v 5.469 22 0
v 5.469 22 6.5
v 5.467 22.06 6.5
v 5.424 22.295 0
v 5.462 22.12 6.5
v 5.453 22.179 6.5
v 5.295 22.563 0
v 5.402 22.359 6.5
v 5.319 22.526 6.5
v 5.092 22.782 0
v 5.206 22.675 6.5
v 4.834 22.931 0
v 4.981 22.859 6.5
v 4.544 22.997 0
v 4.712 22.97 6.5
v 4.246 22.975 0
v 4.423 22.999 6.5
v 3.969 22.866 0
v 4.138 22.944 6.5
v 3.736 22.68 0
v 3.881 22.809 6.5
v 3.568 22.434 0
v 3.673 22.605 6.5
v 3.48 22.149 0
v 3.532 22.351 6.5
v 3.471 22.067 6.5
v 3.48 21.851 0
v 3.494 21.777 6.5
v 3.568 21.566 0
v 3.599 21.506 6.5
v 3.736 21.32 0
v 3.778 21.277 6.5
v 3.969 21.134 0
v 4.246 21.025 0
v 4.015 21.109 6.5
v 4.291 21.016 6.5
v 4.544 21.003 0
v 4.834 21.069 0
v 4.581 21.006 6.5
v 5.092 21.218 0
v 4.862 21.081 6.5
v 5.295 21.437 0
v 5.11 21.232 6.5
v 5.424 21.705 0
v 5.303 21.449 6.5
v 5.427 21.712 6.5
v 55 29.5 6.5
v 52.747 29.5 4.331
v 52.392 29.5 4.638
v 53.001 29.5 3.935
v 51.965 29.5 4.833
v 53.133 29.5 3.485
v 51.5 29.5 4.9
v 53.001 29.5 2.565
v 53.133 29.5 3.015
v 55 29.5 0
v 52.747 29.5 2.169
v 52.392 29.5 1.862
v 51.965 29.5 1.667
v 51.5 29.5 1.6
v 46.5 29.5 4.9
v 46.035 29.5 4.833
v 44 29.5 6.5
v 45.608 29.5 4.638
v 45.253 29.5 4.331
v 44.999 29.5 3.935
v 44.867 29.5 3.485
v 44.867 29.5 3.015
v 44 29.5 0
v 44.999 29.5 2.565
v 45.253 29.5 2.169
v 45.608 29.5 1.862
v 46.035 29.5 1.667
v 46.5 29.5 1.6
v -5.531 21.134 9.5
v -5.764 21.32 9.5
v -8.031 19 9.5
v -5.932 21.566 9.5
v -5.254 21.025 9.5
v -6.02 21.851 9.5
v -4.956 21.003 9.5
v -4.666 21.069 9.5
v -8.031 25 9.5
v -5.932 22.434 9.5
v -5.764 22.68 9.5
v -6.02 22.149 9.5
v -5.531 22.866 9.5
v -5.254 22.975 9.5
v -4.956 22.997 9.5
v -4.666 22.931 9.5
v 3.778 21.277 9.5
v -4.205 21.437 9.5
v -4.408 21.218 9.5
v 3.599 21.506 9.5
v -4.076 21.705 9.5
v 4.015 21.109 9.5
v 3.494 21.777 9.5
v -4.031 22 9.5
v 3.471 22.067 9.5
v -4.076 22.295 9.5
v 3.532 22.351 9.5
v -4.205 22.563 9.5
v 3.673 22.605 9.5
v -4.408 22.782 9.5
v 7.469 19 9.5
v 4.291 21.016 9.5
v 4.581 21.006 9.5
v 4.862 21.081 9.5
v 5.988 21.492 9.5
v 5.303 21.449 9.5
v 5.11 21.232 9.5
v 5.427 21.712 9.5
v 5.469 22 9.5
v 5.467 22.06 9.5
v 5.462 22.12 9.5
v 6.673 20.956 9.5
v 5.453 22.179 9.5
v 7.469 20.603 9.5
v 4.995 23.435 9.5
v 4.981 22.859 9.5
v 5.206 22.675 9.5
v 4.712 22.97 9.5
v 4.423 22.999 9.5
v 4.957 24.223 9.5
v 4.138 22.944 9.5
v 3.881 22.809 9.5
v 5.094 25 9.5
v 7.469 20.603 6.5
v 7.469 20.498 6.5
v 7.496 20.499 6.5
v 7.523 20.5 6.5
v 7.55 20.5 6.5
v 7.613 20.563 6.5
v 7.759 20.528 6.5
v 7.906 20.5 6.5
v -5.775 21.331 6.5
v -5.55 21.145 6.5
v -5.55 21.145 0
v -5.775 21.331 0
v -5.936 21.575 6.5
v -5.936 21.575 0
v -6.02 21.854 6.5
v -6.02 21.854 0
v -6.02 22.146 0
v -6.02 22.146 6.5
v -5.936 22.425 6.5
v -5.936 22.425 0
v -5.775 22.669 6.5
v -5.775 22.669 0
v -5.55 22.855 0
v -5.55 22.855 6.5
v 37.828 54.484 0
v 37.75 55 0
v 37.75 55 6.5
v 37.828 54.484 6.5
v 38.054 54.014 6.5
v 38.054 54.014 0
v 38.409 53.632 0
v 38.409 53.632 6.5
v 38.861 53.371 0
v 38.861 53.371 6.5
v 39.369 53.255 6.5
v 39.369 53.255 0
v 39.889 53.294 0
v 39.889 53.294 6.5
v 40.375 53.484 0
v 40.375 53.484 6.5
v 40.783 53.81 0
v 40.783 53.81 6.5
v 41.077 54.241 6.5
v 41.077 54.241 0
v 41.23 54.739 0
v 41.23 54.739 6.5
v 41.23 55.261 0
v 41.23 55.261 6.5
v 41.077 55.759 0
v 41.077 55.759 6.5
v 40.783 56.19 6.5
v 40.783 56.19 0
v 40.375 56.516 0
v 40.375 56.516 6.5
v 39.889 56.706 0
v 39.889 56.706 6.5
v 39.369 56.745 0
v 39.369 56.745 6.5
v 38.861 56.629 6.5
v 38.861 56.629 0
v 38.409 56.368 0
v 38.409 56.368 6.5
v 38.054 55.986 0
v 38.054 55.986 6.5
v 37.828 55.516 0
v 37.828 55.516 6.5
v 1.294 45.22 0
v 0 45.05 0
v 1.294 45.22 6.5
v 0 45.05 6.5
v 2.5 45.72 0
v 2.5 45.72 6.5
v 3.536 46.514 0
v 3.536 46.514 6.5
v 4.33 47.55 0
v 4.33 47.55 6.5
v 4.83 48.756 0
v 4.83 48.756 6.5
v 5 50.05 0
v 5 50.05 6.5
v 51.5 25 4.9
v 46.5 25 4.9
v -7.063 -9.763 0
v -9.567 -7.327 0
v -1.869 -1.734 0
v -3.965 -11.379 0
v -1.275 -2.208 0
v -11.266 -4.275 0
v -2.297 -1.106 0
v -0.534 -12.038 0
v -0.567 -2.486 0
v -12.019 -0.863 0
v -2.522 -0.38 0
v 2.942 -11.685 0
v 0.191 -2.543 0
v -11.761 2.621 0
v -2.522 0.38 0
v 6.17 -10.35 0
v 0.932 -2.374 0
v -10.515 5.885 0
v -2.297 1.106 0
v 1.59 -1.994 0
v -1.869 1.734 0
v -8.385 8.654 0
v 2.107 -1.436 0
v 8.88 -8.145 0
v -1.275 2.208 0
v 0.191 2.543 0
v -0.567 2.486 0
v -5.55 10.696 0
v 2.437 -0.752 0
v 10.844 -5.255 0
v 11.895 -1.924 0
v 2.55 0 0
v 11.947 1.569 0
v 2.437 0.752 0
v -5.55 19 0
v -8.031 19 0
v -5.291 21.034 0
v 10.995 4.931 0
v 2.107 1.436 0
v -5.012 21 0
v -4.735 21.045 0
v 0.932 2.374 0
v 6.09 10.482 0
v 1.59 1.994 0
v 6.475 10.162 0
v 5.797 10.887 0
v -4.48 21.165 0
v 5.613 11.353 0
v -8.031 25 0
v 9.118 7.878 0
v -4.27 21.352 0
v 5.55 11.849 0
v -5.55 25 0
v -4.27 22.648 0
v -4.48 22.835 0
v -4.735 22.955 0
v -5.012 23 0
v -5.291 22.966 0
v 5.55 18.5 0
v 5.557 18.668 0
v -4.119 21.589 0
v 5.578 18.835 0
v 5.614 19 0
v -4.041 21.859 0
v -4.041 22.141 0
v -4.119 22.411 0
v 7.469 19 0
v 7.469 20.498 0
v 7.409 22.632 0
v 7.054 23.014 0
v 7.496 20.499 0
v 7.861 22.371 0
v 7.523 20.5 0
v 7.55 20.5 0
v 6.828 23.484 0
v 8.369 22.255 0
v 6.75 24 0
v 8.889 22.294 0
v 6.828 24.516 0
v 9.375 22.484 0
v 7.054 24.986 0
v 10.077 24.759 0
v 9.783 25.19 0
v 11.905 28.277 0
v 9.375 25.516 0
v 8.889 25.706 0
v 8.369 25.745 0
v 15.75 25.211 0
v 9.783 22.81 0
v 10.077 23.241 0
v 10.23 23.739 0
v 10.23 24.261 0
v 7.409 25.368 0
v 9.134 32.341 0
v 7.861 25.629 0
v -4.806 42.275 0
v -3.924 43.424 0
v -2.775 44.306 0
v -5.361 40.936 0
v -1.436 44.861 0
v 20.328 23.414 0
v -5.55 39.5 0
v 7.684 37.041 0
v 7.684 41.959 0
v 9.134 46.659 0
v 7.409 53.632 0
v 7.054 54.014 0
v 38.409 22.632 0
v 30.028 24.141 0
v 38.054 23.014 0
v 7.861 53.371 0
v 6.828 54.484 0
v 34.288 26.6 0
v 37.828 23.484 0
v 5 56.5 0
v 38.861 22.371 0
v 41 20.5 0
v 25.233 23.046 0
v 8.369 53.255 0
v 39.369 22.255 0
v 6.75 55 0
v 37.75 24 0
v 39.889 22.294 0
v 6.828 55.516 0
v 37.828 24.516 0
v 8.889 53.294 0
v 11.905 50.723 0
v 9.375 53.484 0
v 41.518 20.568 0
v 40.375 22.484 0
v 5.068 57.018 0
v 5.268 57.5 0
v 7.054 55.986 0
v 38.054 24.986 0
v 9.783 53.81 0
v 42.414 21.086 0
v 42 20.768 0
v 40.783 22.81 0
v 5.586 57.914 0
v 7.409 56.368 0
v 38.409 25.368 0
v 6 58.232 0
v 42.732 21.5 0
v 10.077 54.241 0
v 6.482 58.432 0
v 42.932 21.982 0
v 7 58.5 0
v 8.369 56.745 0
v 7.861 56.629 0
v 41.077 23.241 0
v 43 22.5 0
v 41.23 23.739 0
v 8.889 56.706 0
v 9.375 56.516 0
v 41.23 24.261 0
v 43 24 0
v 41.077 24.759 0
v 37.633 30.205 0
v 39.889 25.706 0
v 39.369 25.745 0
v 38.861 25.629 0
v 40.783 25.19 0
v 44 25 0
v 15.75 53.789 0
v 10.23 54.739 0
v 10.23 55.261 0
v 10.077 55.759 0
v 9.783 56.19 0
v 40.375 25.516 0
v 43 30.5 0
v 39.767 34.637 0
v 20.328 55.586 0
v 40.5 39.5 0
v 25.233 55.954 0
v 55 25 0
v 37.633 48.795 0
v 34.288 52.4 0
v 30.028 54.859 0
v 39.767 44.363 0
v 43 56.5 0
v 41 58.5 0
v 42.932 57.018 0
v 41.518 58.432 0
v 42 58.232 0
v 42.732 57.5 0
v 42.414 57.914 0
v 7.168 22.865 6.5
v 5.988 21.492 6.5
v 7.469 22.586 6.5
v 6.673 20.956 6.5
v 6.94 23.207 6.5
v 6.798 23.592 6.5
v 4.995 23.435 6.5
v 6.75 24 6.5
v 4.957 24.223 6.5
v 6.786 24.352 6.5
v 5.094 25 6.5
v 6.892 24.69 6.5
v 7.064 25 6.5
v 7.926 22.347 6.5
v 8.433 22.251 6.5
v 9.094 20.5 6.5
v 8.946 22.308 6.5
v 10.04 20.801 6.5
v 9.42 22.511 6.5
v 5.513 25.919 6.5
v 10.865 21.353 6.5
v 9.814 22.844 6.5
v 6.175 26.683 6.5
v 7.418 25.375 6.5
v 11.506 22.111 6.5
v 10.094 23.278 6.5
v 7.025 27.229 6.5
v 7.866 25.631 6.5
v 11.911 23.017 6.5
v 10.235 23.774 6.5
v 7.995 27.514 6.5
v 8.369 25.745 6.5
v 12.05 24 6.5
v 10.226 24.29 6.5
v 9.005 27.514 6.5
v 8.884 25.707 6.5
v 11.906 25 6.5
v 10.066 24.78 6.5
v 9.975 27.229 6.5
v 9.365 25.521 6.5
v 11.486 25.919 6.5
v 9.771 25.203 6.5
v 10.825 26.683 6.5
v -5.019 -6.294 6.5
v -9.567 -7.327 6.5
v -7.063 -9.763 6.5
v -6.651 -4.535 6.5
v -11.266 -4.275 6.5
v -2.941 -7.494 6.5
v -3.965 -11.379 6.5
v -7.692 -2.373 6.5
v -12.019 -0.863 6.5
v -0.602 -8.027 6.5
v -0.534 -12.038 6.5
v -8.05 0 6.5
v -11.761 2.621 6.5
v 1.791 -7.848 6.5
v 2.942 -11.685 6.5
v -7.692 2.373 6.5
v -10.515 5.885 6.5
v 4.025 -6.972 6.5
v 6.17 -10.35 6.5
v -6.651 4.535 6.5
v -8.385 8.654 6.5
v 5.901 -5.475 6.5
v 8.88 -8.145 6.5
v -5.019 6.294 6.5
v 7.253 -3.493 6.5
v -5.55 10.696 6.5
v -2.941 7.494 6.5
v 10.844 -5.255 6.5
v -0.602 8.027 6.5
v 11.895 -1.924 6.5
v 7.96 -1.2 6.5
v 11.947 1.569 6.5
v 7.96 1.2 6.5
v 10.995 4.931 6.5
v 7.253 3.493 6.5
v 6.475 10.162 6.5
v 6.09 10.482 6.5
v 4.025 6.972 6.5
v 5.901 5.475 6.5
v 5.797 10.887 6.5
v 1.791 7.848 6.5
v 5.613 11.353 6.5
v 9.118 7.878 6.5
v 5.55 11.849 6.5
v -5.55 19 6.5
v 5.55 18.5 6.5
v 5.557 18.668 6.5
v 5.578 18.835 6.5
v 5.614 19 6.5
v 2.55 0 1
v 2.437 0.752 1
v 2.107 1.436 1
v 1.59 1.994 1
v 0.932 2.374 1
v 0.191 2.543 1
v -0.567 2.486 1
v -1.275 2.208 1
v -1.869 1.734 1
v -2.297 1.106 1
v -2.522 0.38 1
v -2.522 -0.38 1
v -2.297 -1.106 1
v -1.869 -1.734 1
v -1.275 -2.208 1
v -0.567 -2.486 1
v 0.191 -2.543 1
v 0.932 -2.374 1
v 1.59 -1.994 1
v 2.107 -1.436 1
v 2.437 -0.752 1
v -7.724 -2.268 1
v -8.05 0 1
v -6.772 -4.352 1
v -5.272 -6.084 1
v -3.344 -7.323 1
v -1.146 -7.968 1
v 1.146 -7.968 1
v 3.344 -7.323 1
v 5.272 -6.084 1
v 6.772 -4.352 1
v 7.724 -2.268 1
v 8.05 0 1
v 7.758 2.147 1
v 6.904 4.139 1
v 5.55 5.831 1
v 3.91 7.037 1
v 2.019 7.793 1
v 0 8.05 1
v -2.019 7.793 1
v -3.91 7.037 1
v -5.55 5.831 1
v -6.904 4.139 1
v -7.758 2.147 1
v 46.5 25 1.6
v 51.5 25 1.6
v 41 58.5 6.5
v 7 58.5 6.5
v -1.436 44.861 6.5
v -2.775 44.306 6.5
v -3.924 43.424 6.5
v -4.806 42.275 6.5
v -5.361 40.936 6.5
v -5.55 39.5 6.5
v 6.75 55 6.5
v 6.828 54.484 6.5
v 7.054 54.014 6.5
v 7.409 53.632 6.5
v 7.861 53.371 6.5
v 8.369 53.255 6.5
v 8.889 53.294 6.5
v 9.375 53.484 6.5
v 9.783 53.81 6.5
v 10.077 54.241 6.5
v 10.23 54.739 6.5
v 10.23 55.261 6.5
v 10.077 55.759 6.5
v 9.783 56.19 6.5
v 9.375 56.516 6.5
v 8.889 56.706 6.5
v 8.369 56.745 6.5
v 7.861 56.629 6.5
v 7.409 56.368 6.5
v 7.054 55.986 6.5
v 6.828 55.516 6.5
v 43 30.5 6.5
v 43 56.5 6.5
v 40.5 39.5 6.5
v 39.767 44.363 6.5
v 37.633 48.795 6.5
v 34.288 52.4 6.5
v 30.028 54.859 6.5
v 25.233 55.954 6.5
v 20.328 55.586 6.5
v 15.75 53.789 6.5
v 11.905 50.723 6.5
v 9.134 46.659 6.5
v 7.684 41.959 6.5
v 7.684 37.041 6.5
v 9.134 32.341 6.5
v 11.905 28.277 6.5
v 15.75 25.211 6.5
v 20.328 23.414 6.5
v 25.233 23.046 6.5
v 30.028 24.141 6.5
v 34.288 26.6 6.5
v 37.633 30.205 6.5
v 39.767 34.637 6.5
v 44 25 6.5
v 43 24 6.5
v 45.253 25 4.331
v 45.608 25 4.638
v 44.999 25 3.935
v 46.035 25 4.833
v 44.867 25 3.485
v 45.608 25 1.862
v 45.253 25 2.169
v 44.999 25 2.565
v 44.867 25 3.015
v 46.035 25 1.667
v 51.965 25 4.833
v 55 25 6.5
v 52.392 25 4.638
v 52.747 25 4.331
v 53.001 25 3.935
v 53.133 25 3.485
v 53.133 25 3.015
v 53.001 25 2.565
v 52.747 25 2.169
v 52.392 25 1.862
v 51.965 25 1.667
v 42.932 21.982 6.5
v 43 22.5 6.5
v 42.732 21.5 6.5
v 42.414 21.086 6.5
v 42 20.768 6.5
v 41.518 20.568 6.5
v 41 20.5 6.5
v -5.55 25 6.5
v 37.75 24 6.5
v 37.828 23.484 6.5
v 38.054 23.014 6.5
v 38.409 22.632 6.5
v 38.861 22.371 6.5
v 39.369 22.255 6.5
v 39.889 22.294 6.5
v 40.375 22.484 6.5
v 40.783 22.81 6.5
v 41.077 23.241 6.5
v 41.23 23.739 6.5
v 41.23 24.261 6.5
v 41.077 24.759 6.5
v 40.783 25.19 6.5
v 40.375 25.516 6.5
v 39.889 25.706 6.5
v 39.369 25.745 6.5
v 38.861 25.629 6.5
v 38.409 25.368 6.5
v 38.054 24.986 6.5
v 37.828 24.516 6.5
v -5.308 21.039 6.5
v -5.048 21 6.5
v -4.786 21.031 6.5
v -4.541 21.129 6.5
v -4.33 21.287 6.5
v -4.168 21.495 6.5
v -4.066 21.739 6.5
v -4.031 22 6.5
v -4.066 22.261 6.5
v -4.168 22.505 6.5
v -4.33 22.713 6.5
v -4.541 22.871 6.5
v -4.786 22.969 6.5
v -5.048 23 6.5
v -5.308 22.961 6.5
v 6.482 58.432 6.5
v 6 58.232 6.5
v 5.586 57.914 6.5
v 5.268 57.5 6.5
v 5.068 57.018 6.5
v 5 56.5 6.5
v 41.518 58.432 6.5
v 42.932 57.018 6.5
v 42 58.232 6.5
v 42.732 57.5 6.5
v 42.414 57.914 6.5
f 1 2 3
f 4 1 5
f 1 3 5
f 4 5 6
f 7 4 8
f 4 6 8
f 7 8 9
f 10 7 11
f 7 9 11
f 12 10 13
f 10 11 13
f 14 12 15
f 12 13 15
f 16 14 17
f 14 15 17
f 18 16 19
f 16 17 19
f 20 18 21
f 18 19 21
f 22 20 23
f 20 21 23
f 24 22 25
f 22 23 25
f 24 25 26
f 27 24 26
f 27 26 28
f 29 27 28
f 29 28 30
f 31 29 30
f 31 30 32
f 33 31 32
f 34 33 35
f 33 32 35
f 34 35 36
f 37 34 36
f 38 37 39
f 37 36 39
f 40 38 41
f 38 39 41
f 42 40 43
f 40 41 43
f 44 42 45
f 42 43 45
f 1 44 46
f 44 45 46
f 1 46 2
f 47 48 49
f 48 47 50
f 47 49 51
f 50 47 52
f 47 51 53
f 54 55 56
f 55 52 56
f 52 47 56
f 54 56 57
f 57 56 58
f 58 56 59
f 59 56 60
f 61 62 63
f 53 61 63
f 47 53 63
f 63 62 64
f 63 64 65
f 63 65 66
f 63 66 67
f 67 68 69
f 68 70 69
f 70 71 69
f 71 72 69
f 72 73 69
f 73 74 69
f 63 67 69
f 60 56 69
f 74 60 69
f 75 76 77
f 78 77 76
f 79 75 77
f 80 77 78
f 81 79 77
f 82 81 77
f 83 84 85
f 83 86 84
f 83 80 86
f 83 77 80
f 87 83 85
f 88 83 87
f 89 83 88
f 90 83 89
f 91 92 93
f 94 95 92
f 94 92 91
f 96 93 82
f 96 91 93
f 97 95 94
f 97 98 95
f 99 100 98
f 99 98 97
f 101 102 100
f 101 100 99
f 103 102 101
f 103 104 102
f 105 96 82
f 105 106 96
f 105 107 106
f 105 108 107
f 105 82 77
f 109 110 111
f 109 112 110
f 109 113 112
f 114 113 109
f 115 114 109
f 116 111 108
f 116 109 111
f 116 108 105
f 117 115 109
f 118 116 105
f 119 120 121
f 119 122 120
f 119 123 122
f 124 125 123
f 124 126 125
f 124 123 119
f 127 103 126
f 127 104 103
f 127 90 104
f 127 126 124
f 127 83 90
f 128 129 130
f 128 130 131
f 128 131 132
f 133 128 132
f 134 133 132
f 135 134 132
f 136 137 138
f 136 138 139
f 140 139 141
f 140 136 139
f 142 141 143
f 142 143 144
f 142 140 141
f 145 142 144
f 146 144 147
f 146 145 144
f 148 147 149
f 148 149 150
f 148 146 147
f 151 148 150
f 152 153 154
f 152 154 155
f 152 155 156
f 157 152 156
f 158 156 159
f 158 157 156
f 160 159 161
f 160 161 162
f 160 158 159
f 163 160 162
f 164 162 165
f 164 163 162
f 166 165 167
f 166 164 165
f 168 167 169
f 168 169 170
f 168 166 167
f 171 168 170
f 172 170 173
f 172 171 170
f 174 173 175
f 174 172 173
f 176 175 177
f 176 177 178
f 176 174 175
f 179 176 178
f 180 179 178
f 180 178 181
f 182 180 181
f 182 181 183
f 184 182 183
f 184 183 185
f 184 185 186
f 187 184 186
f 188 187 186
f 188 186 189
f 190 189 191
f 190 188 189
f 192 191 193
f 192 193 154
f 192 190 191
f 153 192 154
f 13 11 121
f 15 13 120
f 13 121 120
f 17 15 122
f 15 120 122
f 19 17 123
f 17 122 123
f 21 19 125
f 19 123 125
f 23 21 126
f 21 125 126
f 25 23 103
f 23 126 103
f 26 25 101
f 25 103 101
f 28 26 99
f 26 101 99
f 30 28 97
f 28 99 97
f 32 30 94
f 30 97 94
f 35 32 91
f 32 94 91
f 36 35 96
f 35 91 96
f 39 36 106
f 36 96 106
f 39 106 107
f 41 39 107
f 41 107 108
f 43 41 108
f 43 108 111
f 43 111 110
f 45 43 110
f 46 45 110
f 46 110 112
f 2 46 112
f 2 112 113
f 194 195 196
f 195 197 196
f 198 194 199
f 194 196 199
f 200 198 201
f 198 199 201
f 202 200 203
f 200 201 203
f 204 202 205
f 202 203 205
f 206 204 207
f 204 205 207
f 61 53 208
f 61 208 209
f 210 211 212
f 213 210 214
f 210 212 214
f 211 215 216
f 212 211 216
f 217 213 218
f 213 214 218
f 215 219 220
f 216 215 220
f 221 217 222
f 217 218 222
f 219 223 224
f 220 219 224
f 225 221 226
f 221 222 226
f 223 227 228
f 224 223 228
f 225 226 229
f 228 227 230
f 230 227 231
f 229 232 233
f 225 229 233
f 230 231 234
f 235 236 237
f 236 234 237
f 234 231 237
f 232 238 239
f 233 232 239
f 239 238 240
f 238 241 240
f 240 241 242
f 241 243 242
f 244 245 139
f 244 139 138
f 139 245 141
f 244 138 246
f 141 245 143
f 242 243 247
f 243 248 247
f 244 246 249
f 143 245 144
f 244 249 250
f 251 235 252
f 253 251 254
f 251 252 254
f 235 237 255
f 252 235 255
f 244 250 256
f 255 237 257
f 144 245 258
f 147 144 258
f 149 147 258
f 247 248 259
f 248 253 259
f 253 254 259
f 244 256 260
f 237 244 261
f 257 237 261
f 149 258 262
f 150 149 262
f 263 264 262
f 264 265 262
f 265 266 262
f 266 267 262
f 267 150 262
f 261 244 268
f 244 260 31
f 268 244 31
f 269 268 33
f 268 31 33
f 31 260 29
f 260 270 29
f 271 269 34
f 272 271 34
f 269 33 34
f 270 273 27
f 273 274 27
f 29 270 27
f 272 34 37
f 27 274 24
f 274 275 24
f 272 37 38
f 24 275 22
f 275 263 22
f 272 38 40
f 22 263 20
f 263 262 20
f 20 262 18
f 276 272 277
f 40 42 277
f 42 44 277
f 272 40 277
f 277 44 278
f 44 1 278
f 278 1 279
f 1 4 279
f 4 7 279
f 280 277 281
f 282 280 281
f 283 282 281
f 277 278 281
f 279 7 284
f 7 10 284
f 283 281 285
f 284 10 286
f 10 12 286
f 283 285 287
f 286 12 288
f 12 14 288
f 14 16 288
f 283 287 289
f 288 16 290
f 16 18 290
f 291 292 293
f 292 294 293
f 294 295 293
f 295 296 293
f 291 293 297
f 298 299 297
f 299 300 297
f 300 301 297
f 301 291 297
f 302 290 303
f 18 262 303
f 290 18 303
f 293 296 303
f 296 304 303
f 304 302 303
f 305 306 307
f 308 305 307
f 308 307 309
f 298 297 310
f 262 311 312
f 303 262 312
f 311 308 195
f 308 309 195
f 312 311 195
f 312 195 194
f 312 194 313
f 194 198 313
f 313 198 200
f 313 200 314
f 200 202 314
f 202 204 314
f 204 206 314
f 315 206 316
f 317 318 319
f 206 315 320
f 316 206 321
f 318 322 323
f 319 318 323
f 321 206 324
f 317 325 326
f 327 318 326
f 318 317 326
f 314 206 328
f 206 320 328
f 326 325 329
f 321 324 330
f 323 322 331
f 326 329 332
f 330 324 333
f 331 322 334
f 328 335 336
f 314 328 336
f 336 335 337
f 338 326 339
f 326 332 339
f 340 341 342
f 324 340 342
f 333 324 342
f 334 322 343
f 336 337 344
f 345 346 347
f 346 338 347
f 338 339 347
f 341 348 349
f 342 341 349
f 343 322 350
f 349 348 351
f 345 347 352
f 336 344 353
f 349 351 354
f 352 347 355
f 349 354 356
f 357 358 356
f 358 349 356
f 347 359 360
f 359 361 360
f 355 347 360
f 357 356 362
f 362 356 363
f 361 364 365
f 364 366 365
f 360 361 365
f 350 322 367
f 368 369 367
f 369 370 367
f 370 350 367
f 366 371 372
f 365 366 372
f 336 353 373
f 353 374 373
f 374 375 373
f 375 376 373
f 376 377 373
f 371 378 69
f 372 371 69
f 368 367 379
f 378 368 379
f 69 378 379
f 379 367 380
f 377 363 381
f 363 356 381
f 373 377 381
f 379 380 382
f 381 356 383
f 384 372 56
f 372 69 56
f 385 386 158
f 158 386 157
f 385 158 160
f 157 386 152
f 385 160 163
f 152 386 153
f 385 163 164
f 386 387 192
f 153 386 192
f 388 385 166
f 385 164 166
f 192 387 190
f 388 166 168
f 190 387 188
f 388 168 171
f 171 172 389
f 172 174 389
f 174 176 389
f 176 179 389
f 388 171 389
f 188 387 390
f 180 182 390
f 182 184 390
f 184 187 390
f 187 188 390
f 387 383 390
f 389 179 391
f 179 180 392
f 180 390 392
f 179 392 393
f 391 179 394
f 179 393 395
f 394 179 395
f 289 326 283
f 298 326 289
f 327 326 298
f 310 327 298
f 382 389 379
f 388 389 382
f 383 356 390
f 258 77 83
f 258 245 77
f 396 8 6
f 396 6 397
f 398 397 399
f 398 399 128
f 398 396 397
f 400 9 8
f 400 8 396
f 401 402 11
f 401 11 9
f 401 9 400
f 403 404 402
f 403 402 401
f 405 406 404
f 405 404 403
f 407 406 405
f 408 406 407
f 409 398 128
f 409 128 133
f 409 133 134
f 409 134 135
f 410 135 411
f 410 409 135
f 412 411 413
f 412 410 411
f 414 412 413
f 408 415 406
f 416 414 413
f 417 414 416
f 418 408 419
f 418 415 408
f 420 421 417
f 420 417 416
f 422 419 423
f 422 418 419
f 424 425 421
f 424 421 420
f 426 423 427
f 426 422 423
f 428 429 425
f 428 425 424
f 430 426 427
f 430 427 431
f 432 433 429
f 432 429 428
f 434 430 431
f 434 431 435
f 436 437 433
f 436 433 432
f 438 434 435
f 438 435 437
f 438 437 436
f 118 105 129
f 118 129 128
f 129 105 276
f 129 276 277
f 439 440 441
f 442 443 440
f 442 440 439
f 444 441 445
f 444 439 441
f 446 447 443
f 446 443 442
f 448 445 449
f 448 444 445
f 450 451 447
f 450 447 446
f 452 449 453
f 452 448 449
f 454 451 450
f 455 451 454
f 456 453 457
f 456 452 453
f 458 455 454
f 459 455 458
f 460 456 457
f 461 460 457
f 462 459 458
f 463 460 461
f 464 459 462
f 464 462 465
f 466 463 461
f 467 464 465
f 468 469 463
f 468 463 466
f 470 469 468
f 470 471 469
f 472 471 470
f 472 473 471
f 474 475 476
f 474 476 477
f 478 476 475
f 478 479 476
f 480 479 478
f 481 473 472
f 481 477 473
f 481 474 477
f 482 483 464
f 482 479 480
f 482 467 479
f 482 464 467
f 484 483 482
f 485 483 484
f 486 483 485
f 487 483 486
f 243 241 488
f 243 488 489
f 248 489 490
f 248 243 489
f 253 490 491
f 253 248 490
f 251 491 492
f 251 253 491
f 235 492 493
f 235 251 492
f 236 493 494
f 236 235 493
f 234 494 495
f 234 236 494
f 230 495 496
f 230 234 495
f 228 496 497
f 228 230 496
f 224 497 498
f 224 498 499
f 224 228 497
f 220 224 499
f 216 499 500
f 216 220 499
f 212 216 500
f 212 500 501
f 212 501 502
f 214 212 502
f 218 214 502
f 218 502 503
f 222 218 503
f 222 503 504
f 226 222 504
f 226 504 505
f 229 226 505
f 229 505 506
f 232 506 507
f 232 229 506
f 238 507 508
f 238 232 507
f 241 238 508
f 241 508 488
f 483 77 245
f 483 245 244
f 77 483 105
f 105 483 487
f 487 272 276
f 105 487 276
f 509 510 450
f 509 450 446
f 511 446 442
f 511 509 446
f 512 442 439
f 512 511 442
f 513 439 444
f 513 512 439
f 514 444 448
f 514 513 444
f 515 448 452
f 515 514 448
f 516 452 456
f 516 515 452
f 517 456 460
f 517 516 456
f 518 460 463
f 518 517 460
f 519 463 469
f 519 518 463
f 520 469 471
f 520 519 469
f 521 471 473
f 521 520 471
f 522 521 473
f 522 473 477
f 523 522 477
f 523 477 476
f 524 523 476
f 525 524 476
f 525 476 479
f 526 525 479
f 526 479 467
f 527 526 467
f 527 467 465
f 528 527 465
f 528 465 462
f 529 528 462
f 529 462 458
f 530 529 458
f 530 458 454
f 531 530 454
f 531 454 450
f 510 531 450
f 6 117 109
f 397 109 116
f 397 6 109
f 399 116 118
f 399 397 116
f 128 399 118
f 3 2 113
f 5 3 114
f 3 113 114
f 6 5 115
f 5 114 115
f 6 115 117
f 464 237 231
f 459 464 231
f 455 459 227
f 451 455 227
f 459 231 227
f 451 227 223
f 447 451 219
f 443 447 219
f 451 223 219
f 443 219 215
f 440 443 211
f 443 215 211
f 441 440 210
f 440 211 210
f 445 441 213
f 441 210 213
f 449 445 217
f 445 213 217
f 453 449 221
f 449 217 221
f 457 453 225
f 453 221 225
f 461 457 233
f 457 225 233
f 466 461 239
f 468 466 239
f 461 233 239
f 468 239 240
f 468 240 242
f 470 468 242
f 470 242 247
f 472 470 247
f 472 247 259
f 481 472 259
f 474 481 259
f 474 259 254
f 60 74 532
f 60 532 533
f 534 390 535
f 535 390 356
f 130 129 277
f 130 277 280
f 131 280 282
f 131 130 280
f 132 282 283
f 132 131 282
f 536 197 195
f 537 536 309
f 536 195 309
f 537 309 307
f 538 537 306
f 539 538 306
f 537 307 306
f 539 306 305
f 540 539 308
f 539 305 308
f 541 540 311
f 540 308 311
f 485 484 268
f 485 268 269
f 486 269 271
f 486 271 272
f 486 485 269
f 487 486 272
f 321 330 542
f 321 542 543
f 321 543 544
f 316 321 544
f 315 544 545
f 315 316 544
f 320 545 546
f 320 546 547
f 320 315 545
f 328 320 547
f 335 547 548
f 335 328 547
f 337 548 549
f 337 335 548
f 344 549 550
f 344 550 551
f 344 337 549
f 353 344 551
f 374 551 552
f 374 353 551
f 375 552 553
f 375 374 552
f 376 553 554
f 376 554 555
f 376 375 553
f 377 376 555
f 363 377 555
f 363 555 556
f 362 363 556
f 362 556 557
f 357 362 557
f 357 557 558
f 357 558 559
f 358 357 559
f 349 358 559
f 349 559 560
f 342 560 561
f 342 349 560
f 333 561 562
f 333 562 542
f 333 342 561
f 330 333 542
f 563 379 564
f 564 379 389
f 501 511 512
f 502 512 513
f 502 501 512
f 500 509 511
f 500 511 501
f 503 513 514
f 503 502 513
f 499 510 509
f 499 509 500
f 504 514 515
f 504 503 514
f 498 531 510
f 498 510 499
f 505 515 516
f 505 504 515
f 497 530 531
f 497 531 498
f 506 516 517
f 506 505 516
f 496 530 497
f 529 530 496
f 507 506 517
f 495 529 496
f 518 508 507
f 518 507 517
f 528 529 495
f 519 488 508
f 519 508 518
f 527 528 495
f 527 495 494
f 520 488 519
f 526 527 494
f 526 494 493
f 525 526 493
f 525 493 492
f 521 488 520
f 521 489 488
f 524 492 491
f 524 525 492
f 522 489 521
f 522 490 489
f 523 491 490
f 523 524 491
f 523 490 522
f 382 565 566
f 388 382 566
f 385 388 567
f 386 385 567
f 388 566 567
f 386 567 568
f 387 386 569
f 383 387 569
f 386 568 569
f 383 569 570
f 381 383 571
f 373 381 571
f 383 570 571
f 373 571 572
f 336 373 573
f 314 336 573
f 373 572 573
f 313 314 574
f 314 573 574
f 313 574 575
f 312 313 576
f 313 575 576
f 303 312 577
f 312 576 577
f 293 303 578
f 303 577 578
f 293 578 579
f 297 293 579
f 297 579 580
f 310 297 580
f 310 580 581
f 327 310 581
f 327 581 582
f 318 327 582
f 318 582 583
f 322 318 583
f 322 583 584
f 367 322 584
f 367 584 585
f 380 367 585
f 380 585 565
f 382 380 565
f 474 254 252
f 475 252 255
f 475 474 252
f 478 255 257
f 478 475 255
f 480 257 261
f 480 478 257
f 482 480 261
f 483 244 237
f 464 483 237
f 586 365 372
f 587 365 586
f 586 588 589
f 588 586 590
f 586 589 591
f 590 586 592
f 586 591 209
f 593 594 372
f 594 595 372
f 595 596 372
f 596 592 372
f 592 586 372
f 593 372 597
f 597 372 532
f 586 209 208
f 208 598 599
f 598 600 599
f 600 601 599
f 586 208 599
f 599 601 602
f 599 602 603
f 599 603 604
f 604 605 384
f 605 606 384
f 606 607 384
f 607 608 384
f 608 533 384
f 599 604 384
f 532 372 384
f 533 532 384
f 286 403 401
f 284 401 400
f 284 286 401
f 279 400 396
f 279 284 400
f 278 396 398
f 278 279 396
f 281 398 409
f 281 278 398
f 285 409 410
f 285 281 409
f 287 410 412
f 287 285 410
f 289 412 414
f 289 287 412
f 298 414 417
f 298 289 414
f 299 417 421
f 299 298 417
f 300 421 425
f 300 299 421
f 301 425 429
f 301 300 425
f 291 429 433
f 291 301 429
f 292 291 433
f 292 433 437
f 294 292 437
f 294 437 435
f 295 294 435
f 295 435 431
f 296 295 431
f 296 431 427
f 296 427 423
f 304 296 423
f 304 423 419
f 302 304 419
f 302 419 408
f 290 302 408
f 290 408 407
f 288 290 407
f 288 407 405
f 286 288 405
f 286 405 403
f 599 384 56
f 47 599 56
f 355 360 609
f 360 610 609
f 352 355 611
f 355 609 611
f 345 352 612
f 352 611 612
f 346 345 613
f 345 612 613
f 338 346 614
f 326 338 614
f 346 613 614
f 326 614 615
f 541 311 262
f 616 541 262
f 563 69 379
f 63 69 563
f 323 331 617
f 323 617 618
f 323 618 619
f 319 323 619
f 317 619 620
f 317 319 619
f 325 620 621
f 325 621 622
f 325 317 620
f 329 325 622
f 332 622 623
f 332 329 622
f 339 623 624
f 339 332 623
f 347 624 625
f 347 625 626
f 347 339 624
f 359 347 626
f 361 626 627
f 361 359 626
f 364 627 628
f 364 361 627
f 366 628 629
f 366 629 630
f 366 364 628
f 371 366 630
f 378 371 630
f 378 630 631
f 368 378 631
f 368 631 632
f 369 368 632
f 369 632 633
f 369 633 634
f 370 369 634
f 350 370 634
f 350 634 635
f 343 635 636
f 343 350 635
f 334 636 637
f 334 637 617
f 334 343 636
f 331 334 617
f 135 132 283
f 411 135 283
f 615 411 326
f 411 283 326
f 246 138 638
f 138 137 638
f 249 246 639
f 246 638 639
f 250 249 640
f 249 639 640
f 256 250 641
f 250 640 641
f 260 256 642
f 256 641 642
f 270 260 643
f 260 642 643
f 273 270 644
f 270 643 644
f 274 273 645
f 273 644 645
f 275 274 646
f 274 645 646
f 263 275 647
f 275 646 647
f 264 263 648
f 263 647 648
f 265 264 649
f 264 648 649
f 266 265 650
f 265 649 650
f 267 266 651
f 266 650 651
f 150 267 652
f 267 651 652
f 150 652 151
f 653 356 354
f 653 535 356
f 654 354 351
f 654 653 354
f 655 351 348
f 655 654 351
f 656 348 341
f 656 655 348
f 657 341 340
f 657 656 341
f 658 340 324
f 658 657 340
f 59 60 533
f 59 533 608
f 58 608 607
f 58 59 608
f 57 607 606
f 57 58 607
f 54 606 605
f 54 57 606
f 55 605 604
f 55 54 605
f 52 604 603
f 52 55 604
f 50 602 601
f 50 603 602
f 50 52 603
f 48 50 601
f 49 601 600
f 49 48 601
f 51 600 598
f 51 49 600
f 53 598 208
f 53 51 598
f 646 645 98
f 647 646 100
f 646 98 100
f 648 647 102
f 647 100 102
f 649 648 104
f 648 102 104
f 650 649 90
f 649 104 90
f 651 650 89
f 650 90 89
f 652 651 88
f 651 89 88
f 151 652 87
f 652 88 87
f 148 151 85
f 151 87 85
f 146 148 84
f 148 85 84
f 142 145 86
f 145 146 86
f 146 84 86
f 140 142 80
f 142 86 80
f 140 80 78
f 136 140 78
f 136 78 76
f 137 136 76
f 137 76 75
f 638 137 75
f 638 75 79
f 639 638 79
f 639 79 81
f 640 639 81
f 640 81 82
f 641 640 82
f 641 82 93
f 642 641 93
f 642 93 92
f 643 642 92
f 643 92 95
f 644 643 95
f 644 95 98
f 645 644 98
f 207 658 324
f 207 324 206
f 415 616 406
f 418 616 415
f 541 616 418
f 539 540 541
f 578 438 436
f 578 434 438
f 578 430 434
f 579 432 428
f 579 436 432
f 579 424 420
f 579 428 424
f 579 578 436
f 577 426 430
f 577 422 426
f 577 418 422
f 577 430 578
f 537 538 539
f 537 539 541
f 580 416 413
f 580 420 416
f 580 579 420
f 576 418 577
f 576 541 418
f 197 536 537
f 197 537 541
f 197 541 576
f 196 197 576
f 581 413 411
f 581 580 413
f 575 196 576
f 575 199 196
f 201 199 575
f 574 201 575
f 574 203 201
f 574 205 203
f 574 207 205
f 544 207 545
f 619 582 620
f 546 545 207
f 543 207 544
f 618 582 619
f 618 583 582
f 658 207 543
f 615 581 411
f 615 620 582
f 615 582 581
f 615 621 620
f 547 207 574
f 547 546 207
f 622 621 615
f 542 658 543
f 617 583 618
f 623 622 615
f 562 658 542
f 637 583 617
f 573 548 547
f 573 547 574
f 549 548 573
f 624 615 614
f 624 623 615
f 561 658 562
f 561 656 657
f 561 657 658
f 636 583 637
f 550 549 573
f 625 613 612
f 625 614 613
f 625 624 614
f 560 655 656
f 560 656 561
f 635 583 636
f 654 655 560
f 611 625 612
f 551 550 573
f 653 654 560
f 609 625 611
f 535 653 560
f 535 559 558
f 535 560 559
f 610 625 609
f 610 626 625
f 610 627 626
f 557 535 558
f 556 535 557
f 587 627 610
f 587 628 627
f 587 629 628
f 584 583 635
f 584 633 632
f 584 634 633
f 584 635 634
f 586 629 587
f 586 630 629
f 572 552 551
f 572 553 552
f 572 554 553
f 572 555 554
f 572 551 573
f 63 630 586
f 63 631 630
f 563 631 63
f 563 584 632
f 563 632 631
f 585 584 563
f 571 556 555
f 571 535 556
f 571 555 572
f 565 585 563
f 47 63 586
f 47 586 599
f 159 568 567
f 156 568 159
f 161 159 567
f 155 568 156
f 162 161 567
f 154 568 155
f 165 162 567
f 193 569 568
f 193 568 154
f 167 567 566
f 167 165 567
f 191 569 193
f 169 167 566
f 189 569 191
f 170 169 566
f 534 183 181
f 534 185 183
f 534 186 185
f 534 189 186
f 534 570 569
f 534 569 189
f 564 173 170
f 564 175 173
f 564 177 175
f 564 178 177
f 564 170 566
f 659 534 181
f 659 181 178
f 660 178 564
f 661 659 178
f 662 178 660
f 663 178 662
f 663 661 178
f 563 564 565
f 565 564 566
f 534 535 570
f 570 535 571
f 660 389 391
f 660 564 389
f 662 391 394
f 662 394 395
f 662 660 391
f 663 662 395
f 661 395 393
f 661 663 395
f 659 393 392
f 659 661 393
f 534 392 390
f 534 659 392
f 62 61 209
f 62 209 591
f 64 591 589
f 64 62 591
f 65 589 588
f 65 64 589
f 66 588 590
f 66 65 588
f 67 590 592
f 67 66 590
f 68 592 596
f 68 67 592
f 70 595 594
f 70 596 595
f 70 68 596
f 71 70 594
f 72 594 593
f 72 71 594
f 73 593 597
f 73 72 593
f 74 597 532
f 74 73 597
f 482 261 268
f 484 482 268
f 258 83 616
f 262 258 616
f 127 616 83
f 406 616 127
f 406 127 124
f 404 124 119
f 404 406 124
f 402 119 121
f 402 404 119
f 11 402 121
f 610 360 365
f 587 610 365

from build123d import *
from build123d.topology import SkipClean

# Parameters (mm, degrees)
SKETCH1_R           = 8.05
SKETCH1_R_2         = 1.75
SKETCH1_R_3         = 12.5
BOSS_EXTRUDE3_DEPTH = 6.5
SKETCH1_5_R         = 2.55
BOSS_EXTRUDE2_DEPTH = 1
CUT_EXTRUDE1_DEPTH  = 10
FILLET2_R           = 2
FILLET5_R           = 5
CHAMFER2_SIZE       = 1
FILLET1_R           = 2
SKETCH5_R           = 16.5
CUT_EXTRUDE2_DEPTH  = 10
SKETCH4_R           = 1
CUT_EXTRUDE3_DEPTH  = 10
SKETCH4_4_W         = 1.918871126
SKETCH4_4_H         = 1.5
BOSS_EXTRUDE4_DEPTH = 6.5
SKETCH4_5_W         = 15.5
SKETCH4_5_H         = 6
BOSS_EXTRUDE5_DEPTH = 3
CUT_EXTRUDE5_START  = 9
SKETCH4_6_R         = 1
CUT_EXTRUDE5_DEPTH  = 9
SKETCH6_R           = 3.55
CUT_EXTRUDE6_DEPTH  = 8


with BuildPart() as part:
    # Sketch1 → Boss-Extrude3 (new body)
    with BuildSketch(Plane.XY):
        with BuildLine():
            ThreePointArc((-5.55, 10.695793566), (0, -12.05), (5.55, 10.695793566))
            Line((5.55, 10.695793566), (5.55, 20.5))
            Line((5.55, 20.5), (43, 20.5))
            Line((43, 20.5), (43, 25))
            Line((43, 25), (55, 25))
            Line((55, 25), (55, 29.5))
            Line((55, 29.5), (43, 29.5))
            Line((43, 29.5), (43, 58.5))
            Line((43, 58.5), (5, 58.5))
            Line((5, 58.5), (5, 45.05))
            Line((5, 45.05), (0, 45.05))
            ThreePointArc((0, 45.05), (-3.924442636, 43.424442636), (-5.55, 39.5))
            Line((-5.55, 39.5), (-5.55, 10.695793566))
        make_face()
        with Locations(Location((0, 0, 0), (0, 0, 180))):
            Circle(SKETCH1_R, mode=Mode.SUBTRACT)
        with Locations(Location((8.5, 24, 0), (0, 0, 180))):
            Circle(SKETCH1_R_2, mode=Mode.SUBTRACT)
        with Locations(Location((39.5, 24, 0), (0, 0, 180))):
            Circle(SKETCH1_R_2, mode=Mode.SUBTRACT)
        with Locations(Location((8.5, 55, 0), (0, 0, 180))):
            Circle(SKETCH1_R_2, mode=Mode.SUBTRACT)
        with Locations(Location((24, 39.5, 0), (0, 0, 180))):
            Circle(SKETCH1_R_3, mode=Mode.SUBTRACT)
        with Locations(Location((39.5, 55, 0), (0, 0, 180))):
            Circle(SKETCH1_R_2, mode=Mode.SUBTRACT)
    extrude(amount=BOSS_EXTRUDE3_DEPTH)

    # Sketch1<5> → Boss-Extrude2 (add)
    # profile 1 of 2: a face of its own
    with BuildSketch(Plane.XY):
        with BuildLine():
            Line((-5.55, 5.830951895), (-5.55, 0))
            ThreePointArc((-5.55, 0), (0, -5.55), (5.55, 0))
            Line((5.55, 0), (5.55, 5.830951895))
            ThreePointArc((5.55, 5.830951895), (0, 8.05), (-5.55, 5.830951895))
        make_face()
        Circle(SKETCH1_5_R, mode=Mode.SUBTRACT)
    # profile 2 of 2: a face of its own
    with BuildSketch(Plane.XY):
        with BuildLine():
            ThreePointArc((5.55, 0), (0, -5.55), (-5.55, 0))
            Line((-5.55, 0), (-5.55, 5.830951895))
            ThreePointArc((-5.55, 5.830951895), (-3.172144385, -7.398648525), (8.05, 0))
            ThreePointArc((8.05, 0), (7.398648525, 3.172144385), (5.55, 5.830951895))
            Line((5.55, 5.830951895), (5.55, 0))
        make_face()
    extrude(amount=BOSS_EXTRUDE2_DEPTH)

    # Sketch3 → Cut-Extrude1 (cut)
    with BuildSketch(Plane(origin=(0, 29.5, 0), x_dir=(1, 0, 0), z_dir=(0, 1, 0))):
        with BuildLine():
            Line((46.5, -1.6), (51.5, -1.6))
            ThreePointArc((51.5, -1.6), (53.15, -3.25), (51.5, -4.9))
            Line((51.5, -4.9), (46.5, -4.9))
            ThreePointArc((46.5, -4.9), (44.85, -3.25), (46.5, -1.6))
        make_face()
    extrude(amount=-CUT_EXTRUDE1_DEPTH, mode=Mode.SUBTRACT)

    # Fillet2
    fillet2_edges = [part.edges().sort_by_distance(p)[0] for p in [
        (5.55, 20.5, 3.25),
        (5.55, 10.695793566, 3.25),
    ]]
    fillet(fillet2_edges, radius=FILLET2_R)

    # Fillet5
    fillet5_edges = [part.edges().sort_by_distance(p)[0] for p in [
        (5, 45.05, 3.25),
    ]]
    fillet(fillet5_edges, radius=FILLET5_R - 0.0001)  # a hair under: the kernel refuses the full size

    # Chamfer2
    chamfer2_edges = [part.edges().sort_by_distance(p)[0] for p in [
        (43, 29.5, 3.25),
        (43, 25, 3.25),
    ]]
    chamfer(chamfer2_edges, length=CHAMFER2_SIZE)

    # Fillet1
    fillet1_edges = [part.edges().sort_by_distance(p)[0] for p in [
        (43, 20.5, 3.25),
        (5, 58.5, 3.25),
        (43, 58.5, 3.25),
    ]]
    fillet(fillet1_edges, radius=FILLET1_R)

    # Sketch5 → Cut-Extrude2 (cut)
    with BuildSketch(Plane.XY.offset(6.5)):
        with Locations((24, 39.5)):
            Circle(SKETCH5_R)
    extrude(amount=-CUT_EXTRUDE2_DEPTH, mode=Mode.SUBTRACT)

    # Sketch4 → Cut-Extrude3 (cut)
    with BuildSketch(Plane.XY.offset(6.5)):
        with Locations((4.468871126, 22)):
            Circle(SKETCH4_R)
        with Locations((-5.031128874, 22)):
            Circle(SKETCH4_R)
    extrude(amount=-CUT_EXTRUDE3_DEPTH, mode=Mode.SUBTRACT)

    # Sketch4<4> → Boss-Extrude4 (add)
    with BuildSketch(Plane.XY.offset(6.5)):
        with BuildLine():
            Line((-8.031128874, 25), (-8.031128874, 19))
            Line((-8.031128874, 19), (-5.55, 19))
            Line((-5.55, 19), (-5.55, 21.145147525))
            ThreePointArc((-5.55, 21.145147525), (-6.031128874, 22), (-5.55, 22.854852475))
            Line((-5.55, 22.854852475), (-5.55, 25))
            Line((-5.55, 25), (-8.031128874, 25))
        make_face()
        with Locations((6.509435563, 19.75)):
            Rectangle(SKETCH4_4_W, SKETCH4_4_H)
    extrude(amount=-BOSS_EXTRUDE4_DEPTH)

    # Sketch4<5> → Boss-Extrude5 (add)
    with BuildSketch(Plane.XY.offset(6.5)):
        with Locations((-0.281128874, 22)):
            Rectangle(SKETCH4_5_W, SKETCH4_5_H)
    extrude(amount=BOSS_EXTRUDE5_DEPTH)

    # Sketch4<6> → Cut-Extrude5 (cut)
    with SkipClean():  # the faces are left unmerged after this step: merging them gives an invalid solid
        with BuildSketch(Plane.XY.offset(6.5).offset(CUT_EXTRUDE5_START)):
            with Locations((4.468871126, 22)):
                Circle(SKETCH4_6_R)
            with Locations((-5.031128874, 22)):
                Circle(SKETCH4_6_R)
        extrude(amount=-CUT_EXTRUDE5_DEPTH, mode=Mode.SUBTRACT)
    add(part.part.scale(1), mode=Mode.REPLACE)  # the faces are merged on a copy

    # Sketch6 → Cut-Extrude6 (cut)
    with SkipClean():  # the faces are left unmerged after this step: merging them gives an invalid solid
        with BuildSketch(Plane.XY.offset(6.5)):
            with Locations((8.5, 24)):
                Circle(SKETCH6_R)
        extrude(amount=CUT_EXTRUDE6_DEPTH, mode=Mode.SUBTRACT)


solid = part.part
